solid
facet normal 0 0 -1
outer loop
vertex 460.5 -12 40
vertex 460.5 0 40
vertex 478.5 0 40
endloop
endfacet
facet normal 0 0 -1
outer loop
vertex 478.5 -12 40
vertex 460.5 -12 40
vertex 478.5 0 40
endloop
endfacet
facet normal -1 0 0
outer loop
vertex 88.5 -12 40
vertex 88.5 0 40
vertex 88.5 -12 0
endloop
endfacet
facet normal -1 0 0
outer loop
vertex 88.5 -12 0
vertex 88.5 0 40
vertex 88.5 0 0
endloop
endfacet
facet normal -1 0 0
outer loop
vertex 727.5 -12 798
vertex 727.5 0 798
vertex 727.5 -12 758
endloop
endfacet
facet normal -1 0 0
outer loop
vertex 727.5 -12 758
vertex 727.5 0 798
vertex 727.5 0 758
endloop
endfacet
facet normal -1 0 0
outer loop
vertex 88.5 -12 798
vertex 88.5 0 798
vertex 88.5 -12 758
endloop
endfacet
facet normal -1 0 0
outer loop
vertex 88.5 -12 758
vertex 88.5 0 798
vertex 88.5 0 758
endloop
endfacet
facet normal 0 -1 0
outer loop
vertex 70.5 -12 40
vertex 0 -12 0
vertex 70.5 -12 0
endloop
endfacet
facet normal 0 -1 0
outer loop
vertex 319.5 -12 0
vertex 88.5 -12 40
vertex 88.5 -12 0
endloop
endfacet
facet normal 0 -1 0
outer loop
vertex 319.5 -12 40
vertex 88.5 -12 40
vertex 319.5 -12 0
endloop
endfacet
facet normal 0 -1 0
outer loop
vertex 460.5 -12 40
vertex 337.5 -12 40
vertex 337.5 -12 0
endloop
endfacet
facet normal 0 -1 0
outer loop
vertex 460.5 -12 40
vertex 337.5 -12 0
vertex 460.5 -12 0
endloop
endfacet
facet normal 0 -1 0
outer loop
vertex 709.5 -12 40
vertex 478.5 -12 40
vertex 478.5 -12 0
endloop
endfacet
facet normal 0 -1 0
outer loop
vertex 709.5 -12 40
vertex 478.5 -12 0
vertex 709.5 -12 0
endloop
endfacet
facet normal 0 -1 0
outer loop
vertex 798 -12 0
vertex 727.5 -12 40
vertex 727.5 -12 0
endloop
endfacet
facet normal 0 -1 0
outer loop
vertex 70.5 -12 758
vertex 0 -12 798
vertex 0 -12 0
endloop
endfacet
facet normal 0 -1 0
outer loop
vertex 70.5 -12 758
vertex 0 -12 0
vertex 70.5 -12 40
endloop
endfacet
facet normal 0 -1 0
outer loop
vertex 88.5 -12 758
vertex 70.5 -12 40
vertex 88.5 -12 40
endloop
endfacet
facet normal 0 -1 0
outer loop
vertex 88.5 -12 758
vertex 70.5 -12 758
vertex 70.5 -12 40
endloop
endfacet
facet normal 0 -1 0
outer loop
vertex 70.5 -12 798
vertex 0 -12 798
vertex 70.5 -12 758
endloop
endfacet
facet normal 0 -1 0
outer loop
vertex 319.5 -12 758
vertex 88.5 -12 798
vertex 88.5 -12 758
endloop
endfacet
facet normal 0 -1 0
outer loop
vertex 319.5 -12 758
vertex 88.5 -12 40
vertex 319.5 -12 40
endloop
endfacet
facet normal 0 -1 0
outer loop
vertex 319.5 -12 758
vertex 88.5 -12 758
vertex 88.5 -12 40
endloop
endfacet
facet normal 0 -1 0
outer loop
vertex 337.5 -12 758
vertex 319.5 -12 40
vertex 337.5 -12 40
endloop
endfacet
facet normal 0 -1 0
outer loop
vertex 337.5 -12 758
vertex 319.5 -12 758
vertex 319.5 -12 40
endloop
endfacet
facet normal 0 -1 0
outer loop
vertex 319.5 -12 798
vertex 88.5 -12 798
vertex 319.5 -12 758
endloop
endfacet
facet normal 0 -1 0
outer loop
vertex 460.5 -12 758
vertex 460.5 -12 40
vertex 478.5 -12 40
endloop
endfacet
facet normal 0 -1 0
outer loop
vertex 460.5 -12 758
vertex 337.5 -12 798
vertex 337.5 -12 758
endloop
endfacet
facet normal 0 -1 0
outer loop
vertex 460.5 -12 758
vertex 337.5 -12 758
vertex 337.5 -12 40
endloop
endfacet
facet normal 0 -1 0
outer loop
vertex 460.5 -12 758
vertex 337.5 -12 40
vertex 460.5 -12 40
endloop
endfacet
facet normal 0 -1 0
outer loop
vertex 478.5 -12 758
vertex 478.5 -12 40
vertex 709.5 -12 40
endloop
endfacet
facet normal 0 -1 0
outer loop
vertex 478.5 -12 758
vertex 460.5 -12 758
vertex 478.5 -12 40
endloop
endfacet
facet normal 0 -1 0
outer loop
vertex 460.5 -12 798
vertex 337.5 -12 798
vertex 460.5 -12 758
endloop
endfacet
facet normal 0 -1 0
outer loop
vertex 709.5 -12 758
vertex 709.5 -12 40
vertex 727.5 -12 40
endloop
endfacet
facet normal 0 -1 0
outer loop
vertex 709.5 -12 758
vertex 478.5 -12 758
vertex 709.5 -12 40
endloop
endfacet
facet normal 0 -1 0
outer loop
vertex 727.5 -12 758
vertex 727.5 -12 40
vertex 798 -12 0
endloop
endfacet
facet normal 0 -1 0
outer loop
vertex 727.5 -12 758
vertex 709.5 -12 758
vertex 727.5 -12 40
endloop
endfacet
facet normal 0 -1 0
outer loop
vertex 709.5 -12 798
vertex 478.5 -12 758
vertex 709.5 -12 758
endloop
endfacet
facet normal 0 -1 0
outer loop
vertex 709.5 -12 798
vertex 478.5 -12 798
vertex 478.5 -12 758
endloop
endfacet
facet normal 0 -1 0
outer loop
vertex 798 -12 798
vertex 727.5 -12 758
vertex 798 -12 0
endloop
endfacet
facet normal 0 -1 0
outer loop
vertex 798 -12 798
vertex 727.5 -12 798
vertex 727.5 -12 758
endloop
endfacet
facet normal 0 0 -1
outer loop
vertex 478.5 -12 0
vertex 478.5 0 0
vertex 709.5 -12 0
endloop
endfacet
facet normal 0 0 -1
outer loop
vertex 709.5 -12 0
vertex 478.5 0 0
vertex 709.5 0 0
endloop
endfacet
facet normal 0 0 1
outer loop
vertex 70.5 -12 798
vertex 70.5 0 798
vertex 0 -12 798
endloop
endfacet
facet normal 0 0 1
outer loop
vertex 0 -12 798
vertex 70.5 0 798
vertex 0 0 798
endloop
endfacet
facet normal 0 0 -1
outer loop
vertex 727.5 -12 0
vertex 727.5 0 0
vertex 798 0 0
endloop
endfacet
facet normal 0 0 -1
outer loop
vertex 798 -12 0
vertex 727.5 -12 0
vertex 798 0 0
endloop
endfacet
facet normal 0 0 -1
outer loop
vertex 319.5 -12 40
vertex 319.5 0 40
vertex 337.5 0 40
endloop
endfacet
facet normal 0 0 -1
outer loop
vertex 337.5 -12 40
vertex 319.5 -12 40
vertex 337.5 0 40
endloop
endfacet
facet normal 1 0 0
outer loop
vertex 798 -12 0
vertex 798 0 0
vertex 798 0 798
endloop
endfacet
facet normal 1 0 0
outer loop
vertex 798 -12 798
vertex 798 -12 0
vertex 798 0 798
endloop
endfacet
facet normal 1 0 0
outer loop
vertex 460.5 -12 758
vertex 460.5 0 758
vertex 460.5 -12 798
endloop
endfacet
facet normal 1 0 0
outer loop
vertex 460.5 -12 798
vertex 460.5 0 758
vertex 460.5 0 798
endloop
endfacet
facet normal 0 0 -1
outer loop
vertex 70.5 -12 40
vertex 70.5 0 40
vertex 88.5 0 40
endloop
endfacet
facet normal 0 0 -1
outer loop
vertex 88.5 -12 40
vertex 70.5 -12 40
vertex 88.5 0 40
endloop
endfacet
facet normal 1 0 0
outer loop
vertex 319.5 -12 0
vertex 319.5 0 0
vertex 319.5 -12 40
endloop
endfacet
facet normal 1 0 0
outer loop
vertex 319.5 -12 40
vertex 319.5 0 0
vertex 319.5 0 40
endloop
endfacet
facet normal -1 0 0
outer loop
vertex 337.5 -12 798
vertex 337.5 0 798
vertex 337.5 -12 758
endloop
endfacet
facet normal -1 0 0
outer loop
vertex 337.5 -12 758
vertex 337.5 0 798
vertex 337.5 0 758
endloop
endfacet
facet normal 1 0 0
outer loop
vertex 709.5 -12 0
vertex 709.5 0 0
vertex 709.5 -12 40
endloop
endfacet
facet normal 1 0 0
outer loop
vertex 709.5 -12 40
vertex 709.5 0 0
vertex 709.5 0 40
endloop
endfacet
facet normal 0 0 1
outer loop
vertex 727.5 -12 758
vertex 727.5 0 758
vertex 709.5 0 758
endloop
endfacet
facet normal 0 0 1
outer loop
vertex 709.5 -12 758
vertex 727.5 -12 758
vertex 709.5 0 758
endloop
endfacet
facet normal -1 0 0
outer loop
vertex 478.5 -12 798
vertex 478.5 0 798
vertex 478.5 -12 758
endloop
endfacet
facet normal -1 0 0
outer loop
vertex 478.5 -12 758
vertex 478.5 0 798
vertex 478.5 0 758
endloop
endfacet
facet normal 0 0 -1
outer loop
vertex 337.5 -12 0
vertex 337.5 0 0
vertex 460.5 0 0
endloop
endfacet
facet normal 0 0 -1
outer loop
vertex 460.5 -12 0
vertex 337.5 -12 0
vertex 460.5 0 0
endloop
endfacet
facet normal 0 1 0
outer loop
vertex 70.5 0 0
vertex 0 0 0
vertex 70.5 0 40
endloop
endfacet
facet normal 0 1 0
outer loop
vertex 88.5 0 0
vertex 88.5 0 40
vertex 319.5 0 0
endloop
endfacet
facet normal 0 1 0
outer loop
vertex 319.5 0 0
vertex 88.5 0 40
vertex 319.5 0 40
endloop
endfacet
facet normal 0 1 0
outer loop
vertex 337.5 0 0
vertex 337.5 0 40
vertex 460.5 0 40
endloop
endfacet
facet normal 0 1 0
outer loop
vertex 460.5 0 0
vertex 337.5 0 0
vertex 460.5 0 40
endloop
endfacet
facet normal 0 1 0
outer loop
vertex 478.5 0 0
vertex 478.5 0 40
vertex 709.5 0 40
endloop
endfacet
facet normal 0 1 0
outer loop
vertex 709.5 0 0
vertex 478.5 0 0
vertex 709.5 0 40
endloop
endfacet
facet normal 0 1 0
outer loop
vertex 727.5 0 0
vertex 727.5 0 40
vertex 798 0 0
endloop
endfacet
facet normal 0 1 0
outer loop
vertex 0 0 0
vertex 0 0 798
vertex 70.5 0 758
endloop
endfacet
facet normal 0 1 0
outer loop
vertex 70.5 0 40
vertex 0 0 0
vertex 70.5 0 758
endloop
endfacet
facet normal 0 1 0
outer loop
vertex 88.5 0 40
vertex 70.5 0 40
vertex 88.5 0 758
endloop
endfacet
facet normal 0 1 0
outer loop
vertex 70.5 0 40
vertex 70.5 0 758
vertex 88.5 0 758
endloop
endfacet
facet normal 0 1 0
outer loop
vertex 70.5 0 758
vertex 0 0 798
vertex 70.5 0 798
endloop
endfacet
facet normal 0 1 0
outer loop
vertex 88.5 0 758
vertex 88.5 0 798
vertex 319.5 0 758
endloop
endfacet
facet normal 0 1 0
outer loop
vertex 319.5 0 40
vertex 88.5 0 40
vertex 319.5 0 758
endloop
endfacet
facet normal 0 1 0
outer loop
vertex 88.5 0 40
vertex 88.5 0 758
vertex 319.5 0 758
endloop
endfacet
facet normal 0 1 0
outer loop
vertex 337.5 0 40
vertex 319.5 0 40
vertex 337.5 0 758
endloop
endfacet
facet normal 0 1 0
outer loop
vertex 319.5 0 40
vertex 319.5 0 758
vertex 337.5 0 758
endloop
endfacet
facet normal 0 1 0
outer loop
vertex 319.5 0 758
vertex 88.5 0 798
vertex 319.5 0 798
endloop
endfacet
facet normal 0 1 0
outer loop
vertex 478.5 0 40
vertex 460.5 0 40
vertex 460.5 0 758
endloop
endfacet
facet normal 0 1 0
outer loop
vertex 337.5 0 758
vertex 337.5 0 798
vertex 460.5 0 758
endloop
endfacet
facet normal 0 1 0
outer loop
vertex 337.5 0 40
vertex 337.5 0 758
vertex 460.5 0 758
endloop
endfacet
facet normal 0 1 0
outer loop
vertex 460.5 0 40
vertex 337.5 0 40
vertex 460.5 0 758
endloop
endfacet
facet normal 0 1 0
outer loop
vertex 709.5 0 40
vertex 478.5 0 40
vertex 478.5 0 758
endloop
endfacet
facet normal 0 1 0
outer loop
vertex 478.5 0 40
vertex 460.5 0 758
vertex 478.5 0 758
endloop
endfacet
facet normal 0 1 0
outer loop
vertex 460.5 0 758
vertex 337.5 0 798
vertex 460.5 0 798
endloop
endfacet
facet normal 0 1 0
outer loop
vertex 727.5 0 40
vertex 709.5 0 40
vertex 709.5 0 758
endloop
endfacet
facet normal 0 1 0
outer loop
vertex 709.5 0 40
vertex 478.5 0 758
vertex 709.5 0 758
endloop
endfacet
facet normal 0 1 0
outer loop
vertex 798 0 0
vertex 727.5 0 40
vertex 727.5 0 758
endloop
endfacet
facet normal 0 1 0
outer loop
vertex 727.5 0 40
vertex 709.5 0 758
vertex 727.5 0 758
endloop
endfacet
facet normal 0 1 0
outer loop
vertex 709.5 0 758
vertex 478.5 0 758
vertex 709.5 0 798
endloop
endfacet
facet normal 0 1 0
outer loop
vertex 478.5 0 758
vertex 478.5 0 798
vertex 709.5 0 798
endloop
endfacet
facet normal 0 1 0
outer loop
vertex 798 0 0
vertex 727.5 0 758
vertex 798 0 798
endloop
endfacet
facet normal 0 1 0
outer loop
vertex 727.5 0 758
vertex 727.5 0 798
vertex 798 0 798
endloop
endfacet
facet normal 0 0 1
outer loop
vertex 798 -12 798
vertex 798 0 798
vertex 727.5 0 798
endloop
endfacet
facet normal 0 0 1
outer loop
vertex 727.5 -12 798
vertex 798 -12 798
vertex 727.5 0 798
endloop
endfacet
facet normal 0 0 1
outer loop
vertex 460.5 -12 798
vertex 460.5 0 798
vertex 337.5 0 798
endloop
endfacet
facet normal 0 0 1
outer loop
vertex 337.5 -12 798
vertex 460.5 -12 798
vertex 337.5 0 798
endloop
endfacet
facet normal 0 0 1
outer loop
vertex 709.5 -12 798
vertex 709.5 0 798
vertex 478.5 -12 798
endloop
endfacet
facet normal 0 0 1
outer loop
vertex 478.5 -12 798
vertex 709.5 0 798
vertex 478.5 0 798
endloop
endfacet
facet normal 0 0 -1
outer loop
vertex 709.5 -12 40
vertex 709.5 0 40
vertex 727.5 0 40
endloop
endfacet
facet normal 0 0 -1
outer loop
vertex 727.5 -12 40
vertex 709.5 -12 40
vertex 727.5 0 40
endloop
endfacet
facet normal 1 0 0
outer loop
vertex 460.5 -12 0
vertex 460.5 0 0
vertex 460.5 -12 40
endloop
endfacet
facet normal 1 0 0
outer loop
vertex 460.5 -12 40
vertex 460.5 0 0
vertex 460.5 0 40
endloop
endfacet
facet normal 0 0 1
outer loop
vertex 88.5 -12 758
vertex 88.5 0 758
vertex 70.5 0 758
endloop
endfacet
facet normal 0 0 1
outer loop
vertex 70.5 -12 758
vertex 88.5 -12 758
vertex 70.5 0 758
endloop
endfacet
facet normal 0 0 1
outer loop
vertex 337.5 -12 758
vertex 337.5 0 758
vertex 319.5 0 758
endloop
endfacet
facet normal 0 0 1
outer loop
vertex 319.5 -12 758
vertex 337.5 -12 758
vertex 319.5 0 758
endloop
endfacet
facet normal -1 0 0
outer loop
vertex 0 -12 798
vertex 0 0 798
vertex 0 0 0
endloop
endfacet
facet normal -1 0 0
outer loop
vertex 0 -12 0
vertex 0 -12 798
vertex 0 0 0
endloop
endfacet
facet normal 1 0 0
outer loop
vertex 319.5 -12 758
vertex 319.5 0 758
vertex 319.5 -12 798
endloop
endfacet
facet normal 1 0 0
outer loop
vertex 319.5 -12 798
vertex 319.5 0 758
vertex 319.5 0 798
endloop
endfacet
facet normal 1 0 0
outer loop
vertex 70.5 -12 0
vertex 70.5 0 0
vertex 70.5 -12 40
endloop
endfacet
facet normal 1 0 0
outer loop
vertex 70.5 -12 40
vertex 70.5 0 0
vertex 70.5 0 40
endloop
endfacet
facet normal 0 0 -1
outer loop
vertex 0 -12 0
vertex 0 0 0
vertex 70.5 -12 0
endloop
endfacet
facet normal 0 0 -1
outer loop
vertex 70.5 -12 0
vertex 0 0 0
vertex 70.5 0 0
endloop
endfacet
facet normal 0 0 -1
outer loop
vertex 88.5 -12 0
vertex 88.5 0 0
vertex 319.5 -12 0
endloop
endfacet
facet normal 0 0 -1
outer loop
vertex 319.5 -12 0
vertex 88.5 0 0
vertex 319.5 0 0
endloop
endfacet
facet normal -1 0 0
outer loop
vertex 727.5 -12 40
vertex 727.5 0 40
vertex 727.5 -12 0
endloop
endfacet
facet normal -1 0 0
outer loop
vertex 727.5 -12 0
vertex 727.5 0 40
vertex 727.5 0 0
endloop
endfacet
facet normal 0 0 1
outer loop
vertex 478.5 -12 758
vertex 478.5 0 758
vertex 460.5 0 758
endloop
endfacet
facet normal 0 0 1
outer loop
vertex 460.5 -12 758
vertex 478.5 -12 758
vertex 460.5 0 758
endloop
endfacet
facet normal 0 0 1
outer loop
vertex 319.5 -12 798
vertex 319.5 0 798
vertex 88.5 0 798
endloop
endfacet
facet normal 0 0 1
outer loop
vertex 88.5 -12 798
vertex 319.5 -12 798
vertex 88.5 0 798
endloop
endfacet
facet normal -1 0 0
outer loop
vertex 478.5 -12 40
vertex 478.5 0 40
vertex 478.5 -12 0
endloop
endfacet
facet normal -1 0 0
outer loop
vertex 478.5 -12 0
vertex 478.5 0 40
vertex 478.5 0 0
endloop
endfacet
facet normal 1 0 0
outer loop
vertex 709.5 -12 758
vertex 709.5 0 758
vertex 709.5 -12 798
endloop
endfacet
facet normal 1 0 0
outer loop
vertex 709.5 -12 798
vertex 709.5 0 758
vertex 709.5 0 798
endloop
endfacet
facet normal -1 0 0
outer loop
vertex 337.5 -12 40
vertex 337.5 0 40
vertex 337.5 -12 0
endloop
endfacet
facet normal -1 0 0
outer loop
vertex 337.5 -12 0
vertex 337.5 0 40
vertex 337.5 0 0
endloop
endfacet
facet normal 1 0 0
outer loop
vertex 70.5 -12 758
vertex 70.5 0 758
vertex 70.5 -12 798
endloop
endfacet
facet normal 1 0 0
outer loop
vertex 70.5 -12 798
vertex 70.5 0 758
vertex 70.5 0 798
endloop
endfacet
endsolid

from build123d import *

# Parameters (mm, degrees)
F1_DEPTH = 12


# Not quite as in the source:
# - a feature names something its author has since deleted; it is built from what else it names


with BuildPart() as f1:
    # F0 (on Front) → F1 (new body)
    with BuildSketch(Plane.XZ):
        Polygon((0, 798), (0, 0), (70.5, 0), (70.5, 40), (88.5, 40), (88.5, 0), (319.5, 0), (319.5, 40), (337.5, 40), (337.5, 0), (460.5, 0), (460.5, 40), (478.5, 40), (478.5, 0), (709.5, 0), (709.5, 40), (727.5, 40), (727.5, 0), (798, 0), (798, 798), (727.5, 798), (727.5, 758), (709.5, 758), (709.5, 798), (478.5, 798), (478.5, 758), (460.5, 758), (460.5, 798), (337.5, 798), (337.5, 758), (319.5, 758), (319.5, 798), (88.5, 798), (88.5, 758), (70.5, 758), (70.5, 798), align=None)
    extrude(amount=F1_DEPTH)


solid = f1.part
